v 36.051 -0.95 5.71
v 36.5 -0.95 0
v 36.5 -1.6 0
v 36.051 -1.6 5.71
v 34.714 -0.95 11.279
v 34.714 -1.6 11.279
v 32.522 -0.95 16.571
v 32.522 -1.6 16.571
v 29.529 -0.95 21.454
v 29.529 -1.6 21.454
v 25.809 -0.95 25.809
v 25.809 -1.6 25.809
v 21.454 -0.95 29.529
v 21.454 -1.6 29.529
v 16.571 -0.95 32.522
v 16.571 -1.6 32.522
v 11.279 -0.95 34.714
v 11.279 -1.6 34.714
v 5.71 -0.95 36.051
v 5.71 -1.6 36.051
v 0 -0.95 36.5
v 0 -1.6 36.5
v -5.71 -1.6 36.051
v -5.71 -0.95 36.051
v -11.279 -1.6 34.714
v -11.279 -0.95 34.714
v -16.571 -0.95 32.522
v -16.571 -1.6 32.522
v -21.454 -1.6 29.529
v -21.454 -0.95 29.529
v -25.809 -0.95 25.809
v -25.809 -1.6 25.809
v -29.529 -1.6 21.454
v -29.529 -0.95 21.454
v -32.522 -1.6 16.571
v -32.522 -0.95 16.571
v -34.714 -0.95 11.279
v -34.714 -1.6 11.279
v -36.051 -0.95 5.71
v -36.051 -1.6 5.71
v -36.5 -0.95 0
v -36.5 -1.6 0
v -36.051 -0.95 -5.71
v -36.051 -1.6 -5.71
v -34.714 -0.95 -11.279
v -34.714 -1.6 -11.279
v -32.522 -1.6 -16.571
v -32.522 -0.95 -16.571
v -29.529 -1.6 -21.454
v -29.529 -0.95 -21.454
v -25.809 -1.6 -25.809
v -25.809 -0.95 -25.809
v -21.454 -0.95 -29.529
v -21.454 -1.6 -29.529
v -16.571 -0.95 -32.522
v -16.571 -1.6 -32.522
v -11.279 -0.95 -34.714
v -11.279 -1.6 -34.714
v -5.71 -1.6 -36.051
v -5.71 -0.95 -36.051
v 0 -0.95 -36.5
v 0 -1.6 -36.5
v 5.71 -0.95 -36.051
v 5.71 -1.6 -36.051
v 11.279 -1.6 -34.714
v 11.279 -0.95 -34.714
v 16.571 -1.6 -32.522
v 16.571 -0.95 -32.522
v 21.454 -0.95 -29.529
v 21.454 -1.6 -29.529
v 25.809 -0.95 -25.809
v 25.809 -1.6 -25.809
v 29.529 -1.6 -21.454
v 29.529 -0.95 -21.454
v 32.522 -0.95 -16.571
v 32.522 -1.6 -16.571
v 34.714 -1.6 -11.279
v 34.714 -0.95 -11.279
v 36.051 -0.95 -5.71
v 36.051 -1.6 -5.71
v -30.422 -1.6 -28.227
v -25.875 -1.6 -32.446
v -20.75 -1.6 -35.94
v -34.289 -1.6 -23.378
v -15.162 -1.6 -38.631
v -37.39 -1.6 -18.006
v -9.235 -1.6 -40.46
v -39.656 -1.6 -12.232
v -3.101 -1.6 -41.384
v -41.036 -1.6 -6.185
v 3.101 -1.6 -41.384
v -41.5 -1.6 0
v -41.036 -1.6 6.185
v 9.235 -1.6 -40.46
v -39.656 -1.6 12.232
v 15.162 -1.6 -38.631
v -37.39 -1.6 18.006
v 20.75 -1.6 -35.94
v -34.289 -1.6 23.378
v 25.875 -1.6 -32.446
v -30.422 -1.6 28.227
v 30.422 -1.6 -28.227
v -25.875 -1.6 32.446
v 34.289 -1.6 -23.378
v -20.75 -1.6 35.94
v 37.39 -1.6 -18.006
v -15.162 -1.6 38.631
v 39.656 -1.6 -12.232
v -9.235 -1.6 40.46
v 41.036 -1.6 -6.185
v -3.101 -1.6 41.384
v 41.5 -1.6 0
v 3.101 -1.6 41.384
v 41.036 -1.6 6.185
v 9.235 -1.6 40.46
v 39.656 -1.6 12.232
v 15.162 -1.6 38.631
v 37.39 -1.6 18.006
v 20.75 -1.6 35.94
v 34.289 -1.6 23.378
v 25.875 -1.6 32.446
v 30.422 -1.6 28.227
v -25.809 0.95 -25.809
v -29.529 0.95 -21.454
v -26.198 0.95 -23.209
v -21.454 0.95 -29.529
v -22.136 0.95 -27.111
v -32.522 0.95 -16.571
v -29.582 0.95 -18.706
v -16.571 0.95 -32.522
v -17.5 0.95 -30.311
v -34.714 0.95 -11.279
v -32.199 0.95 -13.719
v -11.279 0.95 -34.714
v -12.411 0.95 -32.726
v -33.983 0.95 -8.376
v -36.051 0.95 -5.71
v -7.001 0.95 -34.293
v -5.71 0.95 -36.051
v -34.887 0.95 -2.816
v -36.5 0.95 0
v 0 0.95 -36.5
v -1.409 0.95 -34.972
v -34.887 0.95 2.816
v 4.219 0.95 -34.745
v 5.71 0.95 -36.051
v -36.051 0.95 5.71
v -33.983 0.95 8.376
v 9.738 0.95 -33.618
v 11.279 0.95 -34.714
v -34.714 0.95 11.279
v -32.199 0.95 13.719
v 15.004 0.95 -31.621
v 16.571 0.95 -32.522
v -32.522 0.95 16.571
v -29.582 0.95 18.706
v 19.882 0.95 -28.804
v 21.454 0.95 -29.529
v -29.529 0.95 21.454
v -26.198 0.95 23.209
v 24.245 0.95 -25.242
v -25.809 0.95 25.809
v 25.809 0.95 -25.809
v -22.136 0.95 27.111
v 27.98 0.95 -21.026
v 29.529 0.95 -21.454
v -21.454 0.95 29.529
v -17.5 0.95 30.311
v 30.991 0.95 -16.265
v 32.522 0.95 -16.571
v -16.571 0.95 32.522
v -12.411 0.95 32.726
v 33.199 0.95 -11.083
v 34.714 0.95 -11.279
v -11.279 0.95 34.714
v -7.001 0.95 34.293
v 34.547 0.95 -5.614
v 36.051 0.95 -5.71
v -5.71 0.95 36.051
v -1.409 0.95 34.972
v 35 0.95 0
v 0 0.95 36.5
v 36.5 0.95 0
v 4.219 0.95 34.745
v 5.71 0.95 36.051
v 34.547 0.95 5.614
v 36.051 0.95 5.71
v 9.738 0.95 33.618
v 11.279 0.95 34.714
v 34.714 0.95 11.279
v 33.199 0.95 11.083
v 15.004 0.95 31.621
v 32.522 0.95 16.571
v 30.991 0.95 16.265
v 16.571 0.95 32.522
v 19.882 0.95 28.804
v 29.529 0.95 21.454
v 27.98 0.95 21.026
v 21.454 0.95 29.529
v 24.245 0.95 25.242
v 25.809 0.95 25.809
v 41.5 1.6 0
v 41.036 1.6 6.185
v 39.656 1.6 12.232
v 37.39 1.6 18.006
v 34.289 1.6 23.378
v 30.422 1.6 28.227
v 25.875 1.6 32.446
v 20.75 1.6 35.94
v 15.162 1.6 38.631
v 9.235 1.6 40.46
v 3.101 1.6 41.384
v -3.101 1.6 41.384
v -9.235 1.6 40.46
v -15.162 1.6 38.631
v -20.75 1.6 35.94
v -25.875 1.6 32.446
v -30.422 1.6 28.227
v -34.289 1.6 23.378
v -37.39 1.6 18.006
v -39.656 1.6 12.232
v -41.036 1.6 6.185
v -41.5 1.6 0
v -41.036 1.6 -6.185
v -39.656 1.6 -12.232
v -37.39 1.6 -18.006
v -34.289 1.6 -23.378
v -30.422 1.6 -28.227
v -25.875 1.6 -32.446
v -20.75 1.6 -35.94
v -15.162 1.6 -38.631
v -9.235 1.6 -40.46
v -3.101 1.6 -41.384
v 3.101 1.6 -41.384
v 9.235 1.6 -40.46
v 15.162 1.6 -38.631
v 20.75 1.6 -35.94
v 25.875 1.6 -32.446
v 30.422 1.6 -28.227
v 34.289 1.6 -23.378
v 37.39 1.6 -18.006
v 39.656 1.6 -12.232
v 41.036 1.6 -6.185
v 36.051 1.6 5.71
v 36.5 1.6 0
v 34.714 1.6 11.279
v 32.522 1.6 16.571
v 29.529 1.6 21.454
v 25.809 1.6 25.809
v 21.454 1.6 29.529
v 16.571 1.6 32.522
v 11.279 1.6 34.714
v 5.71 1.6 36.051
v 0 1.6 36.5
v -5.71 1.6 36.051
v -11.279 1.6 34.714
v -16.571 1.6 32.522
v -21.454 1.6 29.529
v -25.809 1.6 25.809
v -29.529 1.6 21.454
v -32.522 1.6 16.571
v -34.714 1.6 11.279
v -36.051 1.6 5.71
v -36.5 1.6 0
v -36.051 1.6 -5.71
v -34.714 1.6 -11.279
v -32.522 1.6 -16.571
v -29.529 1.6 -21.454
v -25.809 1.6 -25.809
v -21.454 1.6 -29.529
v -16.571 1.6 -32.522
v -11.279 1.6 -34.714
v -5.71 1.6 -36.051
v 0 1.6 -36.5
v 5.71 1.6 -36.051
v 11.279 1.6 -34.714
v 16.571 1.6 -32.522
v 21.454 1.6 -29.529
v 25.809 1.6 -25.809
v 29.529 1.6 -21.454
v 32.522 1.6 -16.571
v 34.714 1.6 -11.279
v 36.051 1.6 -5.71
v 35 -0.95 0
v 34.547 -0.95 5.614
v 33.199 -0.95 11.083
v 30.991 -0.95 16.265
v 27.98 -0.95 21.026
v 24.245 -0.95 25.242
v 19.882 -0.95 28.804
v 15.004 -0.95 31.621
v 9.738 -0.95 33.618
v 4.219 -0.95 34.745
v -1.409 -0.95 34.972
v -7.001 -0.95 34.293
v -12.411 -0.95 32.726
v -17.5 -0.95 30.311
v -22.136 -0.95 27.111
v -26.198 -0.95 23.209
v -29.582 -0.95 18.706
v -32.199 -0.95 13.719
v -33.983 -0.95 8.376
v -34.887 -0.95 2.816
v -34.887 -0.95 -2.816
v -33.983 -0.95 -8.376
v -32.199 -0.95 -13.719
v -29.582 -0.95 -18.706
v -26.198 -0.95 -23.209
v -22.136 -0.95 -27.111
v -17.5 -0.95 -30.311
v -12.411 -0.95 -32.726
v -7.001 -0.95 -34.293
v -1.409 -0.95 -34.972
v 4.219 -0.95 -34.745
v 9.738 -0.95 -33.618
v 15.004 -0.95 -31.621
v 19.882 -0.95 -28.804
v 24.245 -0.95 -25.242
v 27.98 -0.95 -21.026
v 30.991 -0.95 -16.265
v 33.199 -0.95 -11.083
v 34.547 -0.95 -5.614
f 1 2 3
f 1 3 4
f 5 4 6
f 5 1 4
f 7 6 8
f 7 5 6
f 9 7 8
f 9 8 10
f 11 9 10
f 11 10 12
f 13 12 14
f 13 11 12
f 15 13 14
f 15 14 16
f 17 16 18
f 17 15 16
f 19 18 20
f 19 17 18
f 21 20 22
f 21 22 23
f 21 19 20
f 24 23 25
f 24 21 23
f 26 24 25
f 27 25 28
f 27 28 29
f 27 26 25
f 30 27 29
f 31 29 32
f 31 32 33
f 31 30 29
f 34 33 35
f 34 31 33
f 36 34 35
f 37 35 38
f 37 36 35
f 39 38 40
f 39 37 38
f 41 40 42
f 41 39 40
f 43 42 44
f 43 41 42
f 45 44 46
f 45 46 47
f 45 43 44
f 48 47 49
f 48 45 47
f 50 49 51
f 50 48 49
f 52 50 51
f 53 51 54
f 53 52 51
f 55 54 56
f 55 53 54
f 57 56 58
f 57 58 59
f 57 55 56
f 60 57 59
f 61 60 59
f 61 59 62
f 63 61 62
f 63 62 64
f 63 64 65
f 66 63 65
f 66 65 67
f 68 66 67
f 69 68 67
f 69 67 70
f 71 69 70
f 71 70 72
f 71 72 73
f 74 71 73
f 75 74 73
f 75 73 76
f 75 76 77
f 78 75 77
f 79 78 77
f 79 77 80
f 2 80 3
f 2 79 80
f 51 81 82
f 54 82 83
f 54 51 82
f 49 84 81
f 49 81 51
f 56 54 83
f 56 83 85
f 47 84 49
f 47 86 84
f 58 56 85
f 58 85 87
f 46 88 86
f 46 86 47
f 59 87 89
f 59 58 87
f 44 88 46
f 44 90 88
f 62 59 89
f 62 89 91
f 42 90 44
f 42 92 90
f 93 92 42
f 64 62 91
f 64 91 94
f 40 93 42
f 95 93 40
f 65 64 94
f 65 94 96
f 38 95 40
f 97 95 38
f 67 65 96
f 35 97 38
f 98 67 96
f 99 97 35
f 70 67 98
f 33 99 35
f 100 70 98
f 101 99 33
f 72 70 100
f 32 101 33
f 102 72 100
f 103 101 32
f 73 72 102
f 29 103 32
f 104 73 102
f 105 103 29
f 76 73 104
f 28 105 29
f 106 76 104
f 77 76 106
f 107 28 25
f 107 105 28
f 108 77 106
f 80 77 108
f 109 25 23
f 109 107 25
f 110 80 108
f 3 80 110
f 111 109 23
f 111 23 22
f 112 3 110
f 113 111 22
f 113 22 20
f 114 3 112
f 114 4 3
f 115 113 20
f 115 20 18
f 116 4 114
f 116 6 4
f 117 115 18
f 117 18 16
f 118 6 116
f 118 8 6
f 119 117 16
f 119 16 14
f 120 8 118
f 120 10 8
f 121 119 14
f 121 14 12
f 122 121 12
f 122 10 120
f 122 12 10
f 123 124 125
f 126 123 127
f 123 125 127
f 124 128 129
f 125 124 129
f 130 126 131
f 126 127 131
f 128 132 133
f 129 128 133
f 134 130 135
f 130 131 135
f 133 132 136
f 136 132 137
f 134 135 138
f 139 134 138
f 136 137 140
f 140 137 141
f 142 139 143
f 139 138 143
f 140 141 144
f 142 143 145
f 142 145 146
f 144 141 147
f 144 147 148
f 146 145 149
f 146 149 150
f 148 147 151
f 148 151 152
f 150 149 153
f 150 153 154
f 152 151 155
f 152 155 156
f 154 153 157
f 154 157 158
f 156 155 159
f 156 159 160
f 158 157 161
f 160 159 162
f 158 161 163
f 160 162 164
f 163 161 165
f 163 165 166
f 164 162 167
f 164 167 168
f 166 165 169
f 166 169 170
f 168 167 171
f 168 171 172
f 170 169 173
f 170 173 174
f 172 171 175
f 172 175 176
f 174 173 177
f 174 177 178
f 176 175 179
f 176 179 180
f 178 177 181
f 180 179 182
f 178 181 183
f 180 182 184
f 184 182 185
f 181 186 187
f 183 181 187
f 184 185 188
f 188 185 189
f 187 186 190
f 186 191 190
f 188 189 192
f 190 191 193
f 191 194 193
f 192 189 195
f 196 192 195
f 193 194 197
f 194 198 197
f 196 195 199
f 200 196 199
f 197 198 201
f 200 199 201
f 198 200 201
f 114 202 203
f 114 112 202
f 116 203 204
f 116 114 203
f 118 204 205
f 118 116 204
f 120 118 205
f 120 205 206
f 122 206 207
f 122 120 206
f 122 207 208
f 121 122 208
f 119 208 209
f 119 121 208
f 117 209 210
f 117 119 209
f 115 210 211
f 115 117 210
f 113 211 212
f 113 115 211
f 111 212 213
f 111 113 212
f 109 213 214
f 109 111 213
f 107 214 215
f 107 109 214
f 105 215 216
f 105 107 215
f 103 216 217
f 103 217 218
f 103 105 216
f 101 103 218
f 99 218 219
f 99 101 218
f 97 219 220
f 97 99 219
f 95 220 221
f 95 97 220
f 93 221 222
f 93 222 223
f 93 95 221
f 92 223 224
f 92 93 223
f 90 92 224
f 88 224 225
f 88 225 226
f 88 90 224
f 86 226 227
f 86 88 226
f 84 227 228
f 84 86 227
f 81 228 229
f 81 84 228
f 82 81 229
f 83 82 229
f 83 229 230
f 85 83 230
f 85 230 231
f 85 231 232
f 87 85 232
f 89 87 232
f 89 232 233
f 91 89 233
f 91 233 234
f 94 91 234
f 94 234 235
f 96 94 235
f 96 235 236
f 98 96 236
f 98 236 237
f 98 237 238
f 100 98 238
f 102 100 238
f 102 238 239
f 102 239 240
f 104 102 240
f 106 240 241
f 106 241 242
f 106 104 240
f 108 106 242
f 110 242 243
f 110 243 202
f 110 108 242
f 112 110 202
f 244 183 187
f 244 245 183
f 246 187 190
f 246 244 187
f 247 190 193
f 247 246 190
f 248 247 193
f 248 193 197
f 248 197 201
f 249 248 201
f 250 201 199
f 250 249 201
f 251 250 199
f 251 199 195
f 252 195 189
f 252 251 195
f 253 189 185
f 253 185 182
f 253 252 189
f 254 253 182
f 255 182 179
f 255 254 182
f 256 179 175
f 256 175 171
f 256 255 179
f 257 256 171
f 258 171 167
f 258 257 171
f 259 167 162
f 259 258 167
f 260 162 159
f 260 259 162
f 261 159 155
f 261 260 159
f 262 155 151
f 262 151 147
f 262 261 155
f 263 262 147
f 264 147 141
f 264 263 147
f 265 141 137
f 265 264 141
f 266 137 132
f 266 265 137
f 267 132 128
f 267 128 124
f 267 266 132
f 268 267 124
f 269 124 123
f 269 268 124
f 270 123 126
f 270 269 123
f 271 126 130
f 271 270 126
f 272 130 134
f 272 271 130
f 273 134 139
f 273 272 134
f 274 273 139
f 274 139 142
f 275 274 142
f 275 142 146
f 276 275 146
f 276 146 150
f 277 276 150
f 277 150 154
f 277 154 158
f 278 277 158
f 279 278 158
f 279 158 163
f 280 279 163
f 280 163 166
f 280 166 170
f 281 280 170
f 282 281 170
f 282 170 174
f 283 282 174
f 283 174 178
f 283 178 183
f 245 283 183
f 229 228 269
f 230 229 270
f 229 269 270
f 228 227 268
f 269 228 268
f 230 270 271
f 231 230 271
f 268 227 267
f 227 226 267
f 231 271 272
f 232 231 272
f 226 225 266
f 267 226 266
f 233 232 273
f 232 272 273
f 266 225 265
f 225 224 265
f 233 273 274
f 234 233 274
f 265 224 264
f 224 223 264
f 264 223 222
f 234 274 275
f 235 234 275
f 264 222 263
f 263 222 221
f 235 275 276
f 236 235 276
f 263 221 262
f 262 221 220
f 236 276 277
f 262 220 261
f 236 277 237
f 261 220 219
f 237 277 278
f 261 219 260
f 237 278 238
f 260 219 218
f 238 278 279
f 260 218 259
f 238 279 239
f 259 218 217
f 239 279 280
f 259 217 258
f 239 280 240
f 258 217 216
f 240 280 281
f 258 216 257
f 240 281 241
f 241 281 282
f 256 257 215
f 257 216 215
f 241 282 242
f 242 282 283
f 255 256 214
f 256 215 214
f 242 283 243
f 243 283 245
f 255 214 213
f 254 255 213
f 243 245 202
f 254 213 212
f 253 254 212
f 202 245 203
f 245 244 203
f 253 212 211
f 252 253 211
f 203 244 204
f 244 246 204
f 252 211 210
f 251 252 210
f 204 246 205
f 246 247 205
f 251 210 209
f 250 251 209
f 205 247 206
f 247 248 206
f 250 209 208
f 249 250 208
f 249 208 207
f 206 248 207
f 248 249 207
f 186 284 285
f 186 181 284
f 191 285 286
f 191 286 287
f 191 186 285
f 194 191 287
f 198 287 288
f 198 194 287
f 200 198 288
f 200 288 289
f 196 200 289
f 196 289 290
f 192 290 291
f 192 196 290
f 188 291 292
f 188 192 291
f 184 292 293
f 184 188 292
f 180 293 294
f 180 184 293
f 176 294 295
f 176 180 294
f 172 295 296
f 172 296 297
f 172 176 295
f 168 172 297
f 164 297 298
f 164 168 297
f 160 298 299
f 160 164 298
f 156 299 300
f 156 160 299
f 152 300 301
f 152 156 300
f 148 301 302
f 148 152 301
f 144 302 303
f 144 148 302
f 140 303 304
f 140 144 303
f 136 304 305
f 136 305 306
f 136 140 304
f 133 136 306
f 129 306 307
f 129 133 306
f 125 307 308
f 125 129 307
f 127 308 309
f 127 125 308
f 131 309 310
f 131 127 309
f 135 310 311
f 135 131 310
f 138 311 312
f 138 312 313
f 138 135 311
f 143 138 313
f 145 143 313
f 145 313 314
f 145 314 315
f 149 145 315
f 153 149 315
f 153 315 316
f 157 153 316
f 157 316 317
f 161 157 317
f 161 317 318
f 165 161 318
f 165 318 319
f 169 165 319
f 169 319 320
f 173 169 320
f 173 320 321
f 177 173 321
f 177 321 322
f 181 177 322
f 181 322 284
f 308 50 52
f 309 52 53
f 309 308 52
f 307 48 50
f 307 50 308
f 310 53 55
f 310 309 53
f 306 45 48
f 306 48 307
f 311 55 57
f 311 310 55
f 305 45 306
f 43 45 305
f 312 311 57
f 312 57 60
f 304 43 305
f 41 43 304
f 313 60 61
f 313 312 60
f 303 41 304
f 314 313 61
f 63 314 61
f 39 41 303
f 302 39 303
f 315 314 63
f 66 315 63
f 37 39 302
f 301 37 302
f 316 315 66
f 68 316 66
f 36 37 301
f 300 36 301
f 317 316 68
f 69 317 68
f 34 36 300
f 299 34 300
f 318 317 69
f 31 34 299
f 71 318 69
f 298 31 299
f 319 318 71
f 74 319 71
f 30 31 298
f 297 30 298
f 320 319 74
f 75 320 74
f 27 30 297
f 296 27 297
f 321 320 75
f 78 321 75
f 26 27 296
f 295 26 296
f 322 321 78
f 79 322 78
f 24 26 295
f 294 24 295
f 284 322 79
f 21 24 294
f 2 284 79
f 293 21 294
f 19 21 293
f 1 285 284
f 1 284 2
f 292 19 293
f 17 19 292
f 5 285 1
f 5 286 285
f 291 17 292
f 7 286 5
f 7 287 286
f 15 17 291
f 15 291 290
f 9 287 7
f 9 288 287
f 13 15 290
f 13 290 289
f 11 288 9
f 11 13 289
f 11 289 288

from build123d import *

# Parameters (mm, degrees)
F0_R     = 41.5
F0_R_2   = 36.5
F1_DEPTH = 1.6
F2_R     = 36.5
F2_R_2   = 35
F3_DEPTH = 0.95


with BuildPart() as f1:
    # F0 (on Front) → F1 (new body, symmetric)
    with BuildSketch(Plane.XZ):
        Circle(F0_R)
        Circle(F0_R_2, mode=Mode.SUBTRACT)
    extrude(amount=F1_DEPTH, both=True)

    # F2 (on Front) → F3 (join, symmetric)
    with BuildSketch(Plane.XZ):
        Circle(F2_R)
        Circle(F2_R_2, mode=Mode.SUBTRACT)
    extrude(amount=F3_DEPTH, both=True)


solid = f1.part
